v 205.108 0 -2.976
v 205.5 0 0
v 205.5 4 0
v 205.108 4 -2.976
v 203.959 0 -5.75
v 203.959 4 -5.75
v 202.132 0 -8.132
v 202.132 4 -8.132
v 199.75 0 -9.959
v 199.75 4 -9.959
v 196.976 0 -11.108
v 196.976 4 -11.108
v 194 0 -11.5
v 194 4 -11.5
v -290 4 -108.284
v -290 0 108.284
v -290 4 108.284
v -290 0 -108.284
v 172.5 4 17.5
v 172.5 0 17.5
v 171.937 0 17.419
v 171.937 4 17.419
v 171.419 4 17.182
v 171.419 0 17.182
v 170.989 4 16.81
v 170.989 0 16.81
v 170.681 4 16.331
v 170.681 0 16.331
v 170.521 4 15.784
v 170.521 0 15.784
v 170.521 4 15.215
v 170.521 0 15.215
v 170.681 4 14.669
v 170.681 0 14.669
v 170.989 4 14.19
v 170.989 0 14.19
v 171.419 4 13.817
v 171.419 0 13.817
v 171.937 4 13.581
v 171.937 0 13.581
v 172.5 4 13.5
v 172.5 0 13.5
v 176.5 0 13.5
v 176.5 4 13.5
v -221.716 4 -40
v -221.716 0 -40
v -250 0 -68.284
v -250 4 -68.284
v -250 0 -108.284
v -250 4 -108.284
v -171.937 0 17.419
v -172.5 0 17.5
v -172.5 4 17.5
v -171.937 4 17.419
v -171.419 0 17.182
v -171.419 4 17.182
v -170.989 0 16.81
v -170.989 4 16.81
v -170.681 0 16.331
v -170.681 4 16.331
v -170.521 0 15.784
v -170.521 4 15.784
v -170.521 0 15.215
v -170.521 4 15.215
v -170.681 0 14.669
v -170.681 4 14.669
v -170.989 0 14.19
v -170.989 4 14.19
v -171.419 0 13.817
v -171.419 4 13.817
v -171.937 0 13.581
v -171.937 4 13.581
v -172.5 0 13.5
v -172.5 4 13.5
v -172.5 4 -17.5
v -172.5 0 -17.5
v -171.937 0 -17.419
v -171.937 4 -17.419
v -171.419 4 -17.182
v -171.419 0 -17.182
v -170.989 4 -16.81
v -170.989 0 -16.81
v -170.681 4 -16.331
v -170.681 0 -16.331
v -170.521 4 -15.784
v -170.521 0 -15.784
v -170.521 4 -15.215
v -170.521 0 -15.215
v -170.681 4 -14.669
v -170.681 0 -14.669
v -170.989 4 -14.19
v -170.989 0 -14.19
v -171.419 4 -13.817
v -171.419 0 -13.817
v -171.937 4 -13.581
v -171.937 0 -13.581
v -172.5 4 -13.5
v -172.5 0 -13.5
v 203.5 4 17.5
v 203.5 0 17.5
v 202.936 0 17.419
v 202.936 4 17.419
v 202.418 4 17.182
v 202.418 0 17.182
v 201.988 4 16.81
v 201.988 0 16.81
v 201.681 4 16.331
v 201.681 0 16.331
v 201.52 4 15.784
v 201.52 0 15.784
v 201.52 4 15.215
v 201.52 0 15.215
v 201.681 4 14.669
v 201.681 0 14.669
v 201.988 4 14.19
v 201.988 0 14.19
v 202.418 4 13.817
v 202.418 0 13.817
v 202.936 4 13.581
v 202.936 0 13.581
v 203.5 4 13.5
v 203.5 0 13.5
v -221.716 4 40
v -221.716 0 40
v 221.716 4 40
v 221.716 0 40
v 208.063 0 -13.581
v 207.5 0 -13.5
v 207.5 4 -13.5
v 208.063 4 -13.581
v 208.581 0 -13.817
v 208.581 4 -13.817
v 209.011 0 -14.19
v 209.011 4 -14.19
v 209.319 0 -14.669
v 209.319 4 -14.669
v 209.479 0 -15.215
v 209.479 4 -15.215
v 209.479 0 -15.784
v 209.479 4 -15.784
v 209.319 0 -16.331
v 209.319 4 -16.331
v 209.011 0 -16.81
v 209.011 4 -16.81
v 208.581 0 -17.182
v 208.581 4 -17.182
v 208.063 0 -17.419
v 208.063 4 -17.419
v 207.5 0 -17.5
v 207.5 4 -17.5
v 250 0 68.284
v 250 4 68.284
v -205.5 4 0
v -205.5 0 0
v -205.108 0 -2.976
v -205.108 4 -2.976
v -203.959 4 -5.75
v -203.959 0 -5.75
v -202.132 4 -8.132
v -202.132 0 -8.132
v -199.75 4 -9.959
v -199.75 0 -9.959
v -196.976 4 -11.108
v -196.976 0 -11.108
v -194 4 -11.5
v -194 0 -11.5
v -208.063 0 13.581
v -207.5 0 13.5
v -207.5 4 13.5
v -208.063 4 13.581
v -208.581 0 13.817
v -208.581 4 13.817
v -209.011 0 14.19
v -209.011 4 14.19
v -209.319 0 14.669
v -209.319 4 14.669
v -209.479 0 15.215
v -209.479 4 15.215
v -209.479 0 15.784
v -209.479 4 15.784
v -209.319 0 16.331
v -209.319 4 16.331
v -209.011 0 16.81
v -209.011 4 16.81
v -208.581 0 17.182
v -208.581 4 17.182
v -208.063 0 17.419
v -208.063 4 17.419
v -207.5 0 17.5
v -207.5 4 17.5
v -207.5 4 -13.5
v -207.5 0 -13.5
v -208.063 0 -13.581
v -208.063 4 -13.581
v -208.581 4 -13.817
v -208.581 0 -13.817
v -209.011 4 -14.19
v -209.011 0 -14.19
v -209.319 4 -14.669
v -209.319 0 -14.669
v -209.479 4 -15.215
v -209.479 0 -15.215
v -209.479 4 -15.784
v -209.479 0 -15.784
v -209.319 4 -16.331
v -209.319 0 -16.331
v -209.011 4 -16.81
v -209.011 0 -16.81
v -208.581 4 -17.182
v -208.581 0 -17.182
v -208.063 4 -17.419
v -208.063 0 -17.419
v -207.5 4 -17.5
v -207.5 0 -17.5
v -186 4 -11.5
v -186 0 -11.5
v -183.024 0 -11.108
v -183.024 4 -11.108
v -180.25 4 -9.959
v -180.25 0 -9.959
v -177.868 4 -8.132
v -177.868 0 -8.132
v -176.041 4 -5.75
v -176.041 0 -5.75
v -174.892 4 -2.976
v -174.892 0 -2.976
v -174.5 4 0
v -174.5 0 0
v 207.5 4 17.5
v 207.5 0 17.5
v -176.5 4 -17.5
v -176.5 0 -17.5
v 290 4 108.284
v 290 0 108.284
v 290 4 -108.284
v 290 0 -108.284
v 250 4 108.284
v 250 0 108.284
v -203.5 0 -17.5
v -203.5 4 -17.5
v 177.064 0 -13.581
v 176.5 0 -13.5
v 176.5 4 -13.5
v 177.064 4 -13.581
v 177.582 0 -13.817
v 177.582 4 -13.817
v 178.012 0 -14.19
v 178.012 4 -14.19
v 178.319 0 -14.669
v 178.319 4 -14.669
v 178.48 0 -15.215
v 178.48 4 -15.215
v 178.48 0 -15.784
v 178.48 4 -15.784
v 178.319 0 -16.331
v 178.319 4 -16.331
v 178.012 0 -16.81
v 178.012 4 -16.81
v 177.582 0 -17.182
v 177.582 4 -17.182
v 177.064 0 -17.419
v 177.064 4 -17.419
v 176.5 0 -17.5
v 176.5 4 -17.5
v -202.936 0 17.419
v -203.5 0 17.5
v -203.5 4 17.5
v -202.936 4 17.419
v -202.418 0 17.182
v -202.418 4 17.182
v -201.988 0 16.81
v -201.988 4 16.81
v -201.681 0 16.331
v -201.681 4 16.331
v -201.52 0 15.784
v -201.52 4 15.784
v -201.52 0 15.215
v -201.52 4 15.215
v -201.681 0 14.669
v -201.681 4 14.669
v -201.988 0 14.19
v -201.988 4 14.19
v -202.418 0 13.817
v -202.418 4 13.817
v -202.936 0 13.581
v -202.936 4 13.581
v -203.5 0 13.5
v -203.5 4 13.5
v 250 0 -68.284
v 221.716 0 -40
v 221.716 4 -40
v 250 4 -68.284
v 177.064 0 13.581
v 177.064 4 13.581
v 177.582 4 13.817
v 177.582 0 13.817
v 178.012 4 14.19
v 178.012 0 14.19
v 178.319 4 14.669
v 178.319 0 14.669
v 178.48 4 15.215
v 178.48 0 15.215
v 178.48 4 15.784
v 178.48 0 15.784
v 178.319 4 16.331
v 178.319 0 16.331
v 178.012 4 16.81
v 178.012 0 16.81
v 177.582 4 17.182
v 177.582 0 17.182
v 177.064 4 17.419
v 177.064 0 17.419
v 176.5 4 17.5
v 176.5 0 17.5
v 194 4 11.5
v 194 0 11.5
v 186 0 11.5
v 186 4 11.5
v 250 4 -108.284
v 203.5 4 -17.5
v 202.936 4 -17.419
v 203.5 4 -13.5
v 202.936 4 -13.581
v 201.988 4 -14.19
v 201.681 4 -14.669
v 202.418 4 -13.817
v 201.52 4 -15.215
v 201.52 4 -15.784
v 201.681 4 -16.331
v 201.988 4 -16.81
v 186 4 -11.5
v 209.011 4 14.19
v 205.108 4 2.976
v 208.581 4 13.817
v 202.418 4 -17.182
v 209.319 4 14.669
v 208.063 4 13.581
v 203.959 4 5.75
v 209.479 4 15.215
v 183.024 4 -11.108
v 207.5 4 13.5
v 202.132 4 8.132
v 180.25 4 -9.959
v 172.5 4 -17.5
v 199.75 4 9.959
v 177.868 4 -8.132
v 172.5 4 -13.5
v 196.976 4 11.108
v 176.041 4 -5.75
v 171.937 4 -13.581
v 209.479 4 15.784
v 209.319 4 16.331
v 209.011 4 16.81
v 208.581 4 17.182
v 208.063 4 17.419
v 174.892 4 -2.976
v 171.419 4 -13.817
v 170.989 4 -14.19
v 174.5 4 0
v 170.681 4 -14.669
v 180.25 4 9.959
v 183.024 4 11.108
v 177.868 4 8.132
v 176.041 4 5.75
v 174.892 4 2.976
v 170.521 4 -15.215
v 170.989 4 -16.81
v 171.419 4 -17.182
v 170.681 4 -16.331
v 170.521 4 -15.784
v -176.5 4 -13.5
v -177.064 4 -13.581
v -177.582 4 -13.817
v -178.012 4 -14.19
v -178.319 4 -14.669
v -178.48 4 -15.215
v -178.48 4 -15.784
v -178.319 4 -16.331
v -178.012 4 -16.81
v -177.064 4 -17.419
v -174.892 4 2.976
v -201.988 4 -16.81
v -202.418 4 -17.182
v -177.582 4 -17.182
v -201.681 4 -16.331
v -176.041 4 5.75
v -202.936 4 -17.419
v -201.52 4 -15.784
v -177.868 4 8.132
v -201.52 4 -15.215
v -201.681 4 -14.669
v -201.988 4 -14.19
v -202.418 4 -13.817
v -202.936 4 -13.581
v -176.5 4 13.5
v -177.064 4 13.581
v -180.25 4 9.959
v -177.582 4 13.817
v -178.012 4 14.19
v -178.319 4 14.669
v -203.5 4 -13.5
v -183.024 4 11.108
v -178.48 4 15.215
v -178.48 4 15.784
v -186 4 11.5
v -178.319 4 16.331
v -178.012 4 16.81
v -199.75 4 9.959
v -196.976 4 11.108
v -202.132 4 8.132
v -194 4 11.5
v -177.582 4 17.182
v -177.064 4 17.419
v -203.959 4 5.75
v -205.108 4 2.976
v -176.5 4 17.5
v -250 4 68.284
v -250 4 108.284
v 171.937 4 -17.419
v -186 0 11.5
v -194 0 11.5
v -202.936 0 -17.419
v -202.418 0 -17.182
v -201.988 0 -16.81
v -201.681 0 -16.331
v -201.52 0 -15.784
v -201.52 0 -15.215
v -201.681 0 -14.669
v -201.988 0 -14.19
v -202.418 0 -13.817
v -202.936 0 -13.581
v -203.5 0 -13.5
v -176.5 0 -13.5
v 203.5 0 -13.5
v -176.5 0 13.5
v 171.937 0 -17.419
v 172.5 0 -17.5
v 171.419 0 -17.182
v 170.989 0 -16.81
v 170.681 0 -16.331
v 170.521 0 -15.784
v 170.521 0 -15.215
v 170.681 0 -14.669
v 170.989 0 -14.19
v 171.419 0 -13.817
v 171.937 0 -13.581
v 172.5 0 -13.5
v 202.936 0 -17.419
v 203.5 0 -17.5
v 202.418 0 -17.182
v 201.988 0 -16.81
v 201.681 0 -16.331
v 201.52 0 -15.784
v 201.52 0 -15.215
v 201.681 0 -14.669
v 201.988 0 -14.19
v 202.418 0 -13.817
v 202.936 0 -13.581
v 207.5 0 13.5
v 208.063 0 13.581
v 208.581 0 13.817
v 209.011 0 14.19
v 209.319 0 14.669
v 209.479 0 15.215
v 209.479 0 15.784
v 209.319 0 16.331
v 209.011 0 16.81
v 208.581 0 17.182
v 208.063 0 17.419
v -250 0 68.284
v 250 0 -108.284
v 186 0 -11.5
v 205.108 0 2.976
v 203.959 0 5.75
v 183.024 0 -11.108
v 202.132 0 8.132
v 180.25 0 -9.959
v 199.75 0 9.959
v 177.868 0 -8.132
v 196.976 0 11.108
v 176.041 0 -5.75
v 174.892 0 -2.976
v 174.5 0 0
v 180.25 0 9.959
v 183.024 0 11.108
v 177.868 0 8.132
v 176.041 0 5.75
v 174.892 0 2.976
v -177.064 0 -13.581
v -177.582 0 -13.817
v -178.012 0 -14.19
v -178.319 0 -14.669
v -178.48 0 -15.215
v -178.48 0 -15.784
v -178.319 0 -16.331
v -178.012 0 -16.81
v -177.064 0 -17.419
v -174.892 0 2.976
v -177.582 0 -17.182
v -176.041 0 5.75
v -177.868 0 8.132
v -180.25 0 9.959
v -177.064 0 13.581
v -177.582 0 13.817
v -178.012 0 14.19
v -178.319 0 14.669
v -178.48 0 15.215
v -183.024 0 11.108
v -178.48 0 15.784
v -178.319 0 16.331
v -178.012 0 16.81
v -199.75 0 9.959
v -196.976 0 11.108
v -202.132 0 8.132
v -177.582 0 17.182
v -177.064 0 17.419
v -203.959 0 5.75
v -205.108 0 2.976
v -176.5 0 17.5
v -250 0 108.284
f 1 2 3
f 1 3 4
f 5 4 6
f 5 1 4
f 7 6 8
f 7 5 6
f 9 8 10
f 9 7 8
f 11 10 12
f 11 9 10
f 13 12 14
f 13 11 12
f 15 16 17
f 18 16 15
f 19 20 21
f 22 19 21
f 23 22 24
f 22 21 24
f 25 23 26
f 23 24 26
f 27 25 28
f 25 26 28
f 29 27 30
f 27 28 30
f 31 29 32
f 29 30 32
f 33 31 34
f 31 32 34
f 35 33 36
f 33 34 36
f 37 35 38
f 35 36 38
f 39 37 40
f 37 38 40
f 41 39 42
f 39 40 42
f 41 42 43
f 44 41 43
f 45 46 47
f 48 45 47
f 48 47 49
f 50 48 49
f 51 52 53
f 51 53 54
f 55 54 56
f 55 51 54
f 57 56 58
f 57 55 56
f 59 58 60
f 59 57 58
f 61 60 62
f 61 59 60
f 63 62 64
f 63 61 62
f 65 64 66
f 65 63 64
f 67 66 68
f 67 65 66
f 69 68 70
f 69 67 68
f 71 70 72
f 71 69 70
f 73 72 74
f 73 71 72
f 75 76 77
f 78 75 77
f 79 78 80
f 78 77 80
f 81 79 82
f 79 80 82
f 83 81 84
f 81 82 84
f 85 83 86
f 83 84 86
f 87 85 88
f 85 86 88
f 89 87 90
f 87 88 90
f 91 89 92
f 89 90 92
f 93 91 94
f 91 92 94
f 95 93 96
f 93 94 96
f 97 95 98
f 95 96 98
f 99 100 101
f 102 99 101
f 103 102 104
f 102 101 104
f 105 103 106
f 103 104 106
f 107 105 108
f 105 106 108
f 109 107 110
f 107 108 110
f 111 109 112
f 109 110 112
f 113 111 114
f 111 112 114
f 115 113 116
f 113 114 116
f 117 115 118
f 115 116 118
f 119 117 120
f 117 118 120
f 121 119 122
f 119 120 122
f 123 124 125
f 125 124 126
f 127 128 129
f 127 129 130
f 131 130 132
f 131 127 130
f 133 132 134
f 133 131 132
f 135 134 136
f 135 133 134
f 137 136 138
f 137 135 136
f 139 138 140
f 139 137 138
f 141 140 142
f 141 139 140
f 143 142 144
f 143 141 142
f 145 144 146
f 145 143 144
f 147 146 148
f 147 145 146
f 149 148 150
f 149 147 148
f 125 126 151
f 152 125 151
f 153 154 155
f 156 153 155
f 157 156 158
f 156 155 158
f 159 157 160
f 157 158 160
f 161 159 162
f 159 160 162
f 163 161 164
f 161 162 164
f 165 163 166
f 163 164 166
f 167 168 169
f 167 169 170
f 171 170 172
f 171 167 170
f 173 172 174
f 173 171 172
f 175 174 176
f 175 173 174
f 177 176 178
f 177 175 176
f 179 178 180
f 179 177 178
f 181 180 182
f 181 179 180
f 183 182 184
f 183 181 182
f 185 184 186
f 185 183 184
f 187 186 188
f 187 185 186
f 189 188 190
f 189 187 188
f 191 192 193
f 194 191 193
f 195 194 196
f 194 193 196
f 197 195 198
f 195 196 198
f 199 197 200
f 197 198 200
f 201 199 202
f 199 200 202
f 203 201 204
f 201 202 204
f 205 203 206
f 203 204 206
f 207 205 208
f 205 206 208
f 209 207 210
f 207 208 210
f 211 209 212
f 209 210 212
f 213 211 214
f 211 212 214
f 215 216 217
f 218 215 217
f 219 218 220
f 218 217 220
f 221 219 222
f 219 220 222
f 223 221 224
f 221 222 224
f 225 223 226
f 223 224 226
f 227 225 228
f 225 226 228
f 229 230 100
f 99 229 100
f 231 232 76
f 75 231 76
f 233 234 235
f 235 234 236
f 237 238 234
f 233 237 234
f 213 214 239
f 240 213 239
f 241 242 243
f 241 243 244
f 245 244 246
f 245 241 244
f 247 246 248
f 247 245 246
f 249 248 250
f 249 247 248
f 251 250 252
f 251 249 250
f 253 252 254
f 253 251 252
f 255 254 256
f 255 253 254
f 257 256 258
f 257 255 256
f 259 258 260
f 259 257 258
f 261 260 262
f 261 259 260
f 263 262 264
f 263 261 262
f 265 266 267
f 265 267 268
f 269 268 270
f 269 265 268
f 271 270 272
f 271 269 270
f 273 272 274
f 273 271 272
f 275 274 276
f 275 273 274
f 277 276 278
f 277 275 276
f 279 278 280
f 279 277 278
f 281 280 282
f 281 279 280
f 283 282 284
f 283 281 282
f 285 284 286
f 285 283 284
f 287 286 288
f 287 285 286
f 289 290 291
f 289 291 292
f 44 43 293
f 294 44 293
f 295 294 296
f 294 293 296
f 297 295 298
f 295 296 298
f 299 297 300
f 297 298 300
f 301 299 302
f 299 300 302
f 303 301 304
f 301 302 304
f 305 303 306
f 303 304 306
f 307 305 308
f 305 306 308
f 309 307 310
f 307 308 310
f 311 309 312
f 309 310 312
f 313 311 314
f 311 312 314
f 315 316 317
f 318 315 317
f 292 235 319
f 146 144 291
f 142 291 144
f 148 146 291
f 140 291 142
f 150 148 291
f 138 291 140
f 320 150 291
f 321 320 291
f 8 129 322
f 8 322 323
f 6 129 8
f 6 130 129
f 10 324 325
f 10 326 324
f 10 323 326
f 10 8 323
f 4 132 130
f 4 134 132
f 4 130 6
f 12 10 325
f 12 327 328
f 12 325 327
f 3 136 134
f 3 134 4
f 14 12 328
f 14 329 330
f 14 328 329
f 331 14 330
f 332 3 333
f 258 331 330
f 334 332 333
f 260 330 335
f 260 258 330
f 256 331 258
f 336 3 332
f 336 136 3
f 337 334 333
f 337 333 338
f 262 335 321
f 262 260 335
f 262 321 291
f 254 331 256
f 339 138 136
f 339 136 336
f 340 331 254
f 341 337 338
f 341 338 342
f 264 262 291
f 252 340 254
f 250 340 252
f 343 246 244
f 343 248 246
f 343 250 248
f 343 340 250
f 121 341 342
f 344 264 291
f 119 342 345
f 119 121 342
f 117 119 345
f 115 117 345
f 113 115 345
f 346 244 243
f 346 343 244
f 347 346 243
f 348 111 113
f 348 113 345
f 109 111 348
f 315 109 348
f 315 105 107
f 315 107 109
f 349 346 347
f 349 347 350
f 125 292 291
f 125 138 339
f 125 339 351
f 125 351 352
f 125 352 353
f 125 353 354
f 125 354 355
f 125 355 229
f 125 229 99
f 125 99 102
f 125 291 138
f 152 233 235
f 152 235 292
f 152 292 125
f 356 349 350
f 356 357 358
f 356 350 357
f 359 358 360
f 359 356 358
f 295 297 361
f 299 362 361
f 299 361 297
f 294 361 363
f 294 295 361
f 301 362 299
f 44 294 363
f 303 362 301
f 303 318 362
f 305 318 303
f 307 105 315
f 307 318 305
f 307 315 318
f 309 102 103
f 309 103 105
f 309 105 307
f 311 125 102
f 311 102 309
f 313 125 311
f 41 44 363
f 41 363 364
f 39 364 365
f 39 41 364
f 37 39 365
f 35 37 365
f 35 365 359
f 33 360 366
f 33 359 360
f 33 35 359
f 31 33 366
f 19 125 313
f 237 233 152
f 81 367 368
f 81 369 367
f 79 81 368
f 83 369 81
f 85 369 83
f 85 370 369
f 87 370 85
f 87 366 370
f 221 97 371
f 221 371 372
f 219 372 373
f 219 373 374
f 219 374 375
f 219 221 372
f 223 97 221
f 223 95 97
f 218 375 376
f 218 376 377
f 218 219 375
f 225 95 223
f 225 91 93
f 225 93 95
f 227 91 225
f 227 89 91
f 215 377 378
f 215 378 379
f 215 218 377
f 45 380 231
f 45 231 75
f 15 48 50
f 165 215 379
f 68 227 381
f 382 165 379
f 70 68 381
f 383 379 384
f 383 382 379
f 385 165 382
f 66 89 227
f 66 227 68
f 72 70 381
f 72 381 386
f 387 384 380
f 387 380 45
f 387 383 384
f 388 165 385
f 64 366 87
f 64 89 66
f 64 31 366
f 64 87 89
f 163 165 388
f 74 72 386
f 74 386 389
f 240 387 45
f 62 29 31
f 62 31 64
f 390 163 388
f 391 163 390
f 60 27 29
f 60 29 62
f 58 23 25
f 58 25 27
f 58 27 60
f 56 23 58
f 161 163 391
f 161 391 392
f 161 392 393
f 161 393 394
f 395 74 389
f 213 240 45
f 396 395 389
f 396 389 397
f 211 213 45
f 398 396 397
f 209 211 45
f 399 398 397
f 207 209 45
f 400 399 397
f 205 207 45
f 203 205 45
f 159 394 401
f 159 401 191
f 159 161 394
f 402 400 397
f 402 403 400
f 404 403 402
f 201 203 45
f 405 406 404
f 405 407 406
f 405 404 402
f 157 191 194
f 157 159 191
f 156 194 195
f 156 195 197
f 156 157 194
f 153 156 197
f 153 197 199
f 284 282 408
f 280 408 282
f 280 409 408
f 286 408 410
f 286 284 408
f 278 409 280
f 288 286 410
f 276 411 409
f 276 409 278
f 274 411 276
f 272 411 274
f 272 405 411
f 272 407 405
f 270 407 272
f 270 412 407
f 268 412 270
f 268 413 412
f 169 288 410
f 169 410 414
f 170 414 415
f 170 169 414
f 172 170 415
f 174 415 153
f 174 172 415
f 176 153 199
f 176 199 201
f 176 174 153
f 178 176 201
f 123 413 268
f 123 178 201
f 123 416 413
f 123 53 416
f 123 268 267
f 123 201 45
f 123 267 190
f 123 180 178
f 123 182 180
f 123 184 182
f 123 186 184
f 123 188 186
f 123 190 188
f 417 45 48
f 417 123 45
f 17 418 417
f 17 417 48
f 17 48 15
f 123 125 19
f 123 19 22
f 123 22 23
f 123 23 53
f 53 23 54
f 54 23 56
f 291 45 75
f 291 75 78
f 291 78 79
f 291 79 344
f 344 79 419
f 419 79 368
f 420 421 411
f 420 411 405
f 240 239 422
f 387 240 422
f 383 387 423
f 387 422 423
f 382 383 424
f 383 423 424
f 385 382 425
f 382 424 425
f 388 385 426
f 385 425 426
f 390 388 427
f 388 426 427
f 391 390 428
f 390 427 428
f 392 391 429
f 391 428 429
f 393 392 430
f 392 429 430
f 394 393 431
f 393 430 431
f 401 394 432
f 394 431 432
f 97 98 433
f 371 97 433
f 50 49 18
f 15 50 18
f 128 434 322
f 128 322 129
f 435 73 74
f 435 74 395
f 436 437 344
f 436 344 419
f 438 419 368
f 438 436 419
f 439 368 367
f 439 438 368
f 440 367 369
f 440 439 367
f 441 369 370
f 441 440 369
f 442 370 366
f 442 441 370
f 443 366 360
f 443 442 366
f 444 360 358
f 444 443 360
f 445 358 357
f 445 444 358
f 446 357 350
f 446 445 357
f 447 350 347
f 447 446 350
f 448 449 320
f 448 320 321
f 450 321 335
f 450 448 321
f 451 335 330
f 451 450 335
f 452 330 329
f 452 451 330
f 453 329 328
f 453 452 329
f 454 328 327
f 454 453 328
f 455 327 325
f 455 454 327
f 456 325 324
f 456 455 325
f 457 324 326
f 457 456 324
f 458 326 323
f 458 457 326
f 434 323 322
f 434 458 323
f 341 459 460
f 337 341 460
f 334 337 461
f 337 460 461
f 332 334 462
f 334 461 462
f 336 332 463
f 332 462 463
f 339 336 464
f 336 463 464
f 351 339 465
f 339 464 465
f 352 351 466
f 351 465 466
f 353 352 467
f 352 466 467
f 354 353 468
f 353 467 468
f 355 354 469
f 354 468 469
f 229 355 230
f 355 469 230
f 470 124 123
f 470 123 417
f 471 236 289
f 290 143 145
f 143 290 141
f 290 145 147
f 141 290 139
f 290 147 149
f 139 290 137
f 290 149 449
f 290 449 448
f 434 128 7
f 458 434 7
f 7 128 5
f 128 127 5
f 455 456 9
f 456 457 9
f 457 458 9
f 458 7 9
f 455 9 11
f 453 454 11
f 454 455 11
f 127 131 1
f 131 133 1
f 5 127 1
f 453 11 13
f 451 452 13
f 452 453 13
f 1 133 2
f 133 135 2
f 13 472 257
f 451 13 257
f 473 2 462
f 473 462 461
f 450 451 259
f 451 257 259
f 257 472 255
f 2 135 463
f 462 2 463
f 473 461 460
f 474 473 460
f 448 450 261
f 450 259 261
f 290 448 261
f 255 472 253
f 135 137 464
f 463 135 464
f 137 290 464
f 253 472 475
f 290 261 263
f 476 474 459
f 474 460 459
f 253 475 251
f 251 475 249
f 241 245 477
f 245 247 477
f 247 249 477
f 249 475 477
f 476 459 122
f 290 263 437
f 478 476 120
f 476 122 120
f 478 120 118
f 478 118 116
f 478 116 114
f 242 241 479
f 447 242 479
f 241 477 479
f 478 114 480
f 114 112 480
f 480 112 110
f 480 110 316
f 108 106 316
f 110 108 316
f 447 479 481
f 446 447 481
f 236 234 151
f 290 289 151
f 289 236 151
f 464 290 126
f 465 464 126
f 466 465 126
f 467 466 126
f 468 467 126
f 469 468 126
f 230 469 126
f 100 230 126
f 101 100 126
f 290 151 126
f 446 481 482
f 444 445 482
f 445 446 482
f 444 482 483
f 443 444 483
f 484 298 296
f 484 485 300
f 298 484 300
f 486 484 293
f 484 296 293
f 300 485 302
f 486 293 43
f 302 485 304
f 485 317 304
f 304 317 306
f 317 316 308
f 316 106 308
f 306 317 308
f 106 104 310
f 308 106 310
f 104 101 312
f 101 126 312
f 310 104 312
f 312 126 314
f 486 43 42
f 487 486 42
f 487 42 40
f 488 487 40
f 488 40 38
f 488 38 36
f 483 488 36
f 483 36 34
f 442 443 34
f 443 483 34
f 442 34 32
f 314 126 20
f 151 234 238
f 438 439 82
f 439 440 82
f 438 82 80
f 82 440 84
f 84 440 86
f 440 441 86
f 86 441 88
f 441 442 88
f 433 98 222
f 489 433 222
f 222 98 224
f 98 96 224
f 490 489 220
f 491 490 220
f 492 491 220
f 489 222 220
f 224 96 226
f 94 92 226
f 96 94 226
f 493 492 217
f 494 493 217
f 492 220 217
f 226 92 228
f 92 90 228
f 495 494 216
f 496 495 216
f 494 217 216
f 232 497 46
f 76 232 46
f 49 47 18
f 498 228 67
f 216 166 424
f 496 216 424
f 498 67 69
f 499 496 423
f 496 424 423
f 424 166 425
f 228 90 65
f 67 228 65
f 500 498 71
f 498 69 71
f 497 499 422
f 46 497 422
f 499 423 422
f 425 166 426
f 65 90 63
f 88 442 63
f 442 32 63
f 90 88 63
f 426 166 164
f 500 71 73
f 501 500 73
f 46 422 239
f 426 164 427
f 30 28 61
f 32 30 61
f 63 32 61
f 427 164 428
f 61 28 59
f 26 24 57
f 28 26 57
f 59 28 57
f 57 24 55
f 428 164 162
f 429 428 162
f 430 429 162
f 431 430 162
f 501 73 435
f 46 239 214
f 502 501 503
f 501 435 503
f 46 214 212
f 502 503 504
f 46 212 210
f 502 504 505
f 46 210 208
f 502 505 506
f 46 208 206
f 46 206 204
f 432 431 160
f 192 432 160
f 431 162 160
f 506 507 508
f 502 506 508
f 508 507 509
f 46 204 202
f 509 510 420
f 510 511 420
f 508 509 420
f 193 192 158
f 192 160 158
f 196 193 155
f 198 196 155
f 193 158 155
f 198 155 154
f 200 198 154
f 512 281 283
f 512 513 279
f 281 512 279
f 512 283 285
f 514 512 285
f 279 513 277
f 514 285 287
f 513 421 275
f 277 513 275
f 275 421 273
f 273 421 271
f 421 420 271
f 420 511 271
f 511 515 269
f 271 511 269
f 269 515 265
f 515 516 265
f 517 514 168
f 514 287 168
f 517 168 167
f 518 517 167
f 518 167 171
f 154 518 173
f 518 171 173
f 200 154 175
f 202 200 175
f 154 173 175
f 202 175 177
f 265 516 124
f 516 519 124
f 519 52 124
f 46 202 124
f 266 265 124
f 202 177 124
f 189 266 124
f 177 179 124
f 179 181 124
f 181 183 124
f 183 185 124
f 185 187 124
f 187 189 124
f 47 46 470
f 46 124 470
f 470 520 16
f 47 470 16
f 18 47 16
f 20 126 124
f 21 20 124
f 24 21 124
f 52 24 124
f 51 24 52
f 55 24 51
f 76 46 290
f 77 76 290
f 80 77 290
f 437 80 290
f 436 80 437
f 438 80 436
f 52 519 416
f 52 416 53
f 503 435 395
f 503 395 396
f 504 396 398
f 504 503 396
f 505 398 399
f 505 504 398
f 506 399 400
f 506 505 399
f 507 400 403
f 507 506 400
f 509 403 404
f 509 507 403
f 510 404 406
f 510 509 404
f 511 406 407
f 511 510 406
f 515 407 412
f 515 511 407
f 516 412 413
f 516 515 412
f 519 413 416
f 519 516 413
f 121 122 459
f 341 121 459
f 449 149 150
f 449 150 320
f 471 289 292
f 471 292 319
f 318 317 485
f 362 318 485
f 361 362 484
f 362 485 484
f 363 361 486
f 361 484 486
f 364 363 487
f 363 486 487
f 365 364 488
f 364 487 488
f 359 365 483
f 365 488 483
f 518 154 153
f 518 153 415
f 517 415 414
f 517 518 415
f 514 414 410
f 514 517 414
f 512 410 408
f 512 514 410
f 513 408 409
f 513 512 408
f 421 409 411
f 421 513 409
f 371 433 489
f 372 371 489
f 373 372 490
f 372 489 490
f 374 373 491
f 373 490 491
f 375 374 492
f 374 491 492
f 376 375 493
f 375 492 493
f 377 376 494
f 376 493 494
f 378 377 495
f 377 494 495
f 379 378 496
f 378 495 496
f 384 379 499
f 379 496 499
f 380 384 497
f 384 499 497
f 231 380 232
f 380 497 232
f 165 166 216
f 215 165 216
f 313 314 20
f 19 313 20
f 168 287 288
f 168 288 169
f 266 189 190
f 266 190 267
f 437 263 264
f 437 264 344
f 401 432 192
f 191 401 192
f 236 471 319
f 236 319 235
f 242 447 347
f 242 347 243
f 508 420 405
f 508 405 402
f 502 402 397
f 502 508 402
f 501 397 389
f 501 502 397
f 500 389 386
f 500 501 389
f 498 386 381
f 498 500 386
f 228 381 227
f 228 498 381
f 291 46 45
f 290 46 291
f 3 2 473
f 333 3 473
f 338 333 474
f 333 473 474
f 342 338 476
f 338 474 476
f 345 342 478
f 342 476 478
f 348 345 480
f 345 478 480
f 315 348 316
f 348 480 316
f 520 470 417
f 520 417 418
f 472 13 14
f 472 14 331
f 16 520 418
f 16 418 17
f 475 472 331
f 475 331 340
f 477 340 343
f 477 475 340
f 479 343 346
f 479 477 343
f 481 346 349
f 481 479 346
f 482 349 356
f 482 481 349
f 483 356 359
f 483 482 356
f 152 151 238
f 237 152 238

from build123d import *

# Parameters (mm, degrees)
BOSS_EXTRUDE1_DEPTH  = 4
MIRROR6_COPY_1_DEPTH = 4
MIRROR6_COPY_2_DEPTH = 4


with BuildPart() as part:
    # Sketch1 → Boss-Extrude1 (new body)
    with BuildSketch(Plane(origin=(0, 0, 0), x_dir=(1, 0, 0), z_dir=(0, 1, 0))):
        with BuildLine():
            Line((-290, 108.284271247), (-290, 0))
            Line((-290, 0), (-205.5, 0))
            ThreePointArc((-205.5, 0), (-202.131727984, 8.131727984), (-194, 11.5))
            Line((-194, 11.5), (-186, 11.5))
            ThreePointArc((-186, 11.5), (-177.868272016, 8.131727984), (-174.5, 0))
            Line((-174.5, 0), (0, 0))
            Line((0, 0), (0, 40))
            Line((0, 40), (-221.715728753, 40))
            Line((-221.715728753, 40), (-250, 68.284271247))
            Line((-250, 68.284271247), (-250, 108.284271247))
            Line((-250, 108.284271247), (-290, 108.284271247))
        make_face()
        with BuildLine():
            ThreePointArc((-207.499780644, 13.499780644), (-209.499780644, 15.499780644), (-207.499780644, 17.499780644))
            Line((-207.499780644, 17.499780644), (-203.499780644, 17.499780644))
            ThreePointArc((-203.499780644, 17.499780644), (-201.499780644, 15.499780644), (-203.499780644, 13.499780644))
            Line((-203.499780644, 13.499780644), (-207.499780644, 13.499780644))
        make_face(mode=Mode.SUBTRACT)
        with BuildLine():
            Line((-176.500219356, 17.499780644), (-172.500219356, 17.499780644))
            ThreePointArc((-172.500219356, 17.499780644), (-170.500219356, 15.499780644), (-172.500219356, 13.499780644))
            Line((-172.500219356, 13.499780644), (-176.500219356, 13.499780644))
            ThreePointArc((-176.500219356, 13.499780644), (-178.500219356, 15.499780644), (-176.500219356, 17.499780644))
        make_face(mode=Mode.SUBTRACT)
    boss_extrude1 = extrude(amount=BOSS_EXTRUDE1_DEPTH)

    # Mirror1: Boss-Extrude1 across plane
    add(boss_extrude1.mirror(Plane(origin=(0, 4, 0), x_dir=(1, 0, 0), z_dir=(0, 0, -1))))

    # Mirror5: Boss-Extrude1 across plane
    add(boss_extrude1.mirror(Plane(origin=(0, 4, 0), x_dir=(0, 0, 1), z_dir=(1, 0, 0))))

    # Mirror6 copy 1 sketch → Mirror6 copy 1 (add)
    with BuildSketch(Plane(origin=(0, 0, 0), x_dir=(-1, 0, 0), z_dir=(0, 1, 0))):
        with BuildLine():
            Line((-290, 108.284271247), (-290, 0))
            Line((-290, 0), (-205.5, 0))
            ThreePointArc((-205.5, 0), (-202.131727984, 8.131727984), (-194, 11.5))
            Line((-194, 11.5), (-186, 11.5))
            ThreePointArc((-186, 11.5), (-177.868272016, 8.131727984), (-174.5, 0))
            Line((-174.5, 0), (0, 0))
            Line((0, 0), (0, 40))
            Line((0, 40), (-221.715728753, 40))
            Line((-221.715728753, 40), (-250, 68.284271247))
            Line((-250, 68.284271247), (-250, 108.284271247))
            Line((-250, 108.284271247), (-290, 108.284271247))
        make_face()
        with BuildLine():
            ThreePointArc((-207.499780644, 13.499780644), (-209.499780644, 15.499780644), (-207.499780644, 17.499780644))
            Line((-207.499780644, 17.499780644), (-203.499780644, 17.499780644))
            ThreePointArc((-203.499780644, 17.499780644), (-201.499780644, 15.499780644), (-203.499780644, 13.499780644))
            Line((-203.499780644, 13.499780644), (-207.499780644, 13.499780644))
        make_face(mode=Mode.SUBTRACT)
        with BuildLine():
            Line((-176.500219356, 17.499780644), (-172.500219356, 17.499780644))
            ThreePointArc((-172.500219356, 17.499780644), (-170.500219356, 15.499780644), (-172.500219356, 13.499780644))
            Line((-172.500219356, 13.499780644), (-176.500219356, 13.499780644))
            ThreePointArc((-176.500219356, 13.499780644), (-178.500219356, 15.499780644), (-176.500219356, 17.499780644))
        make_face(mode=Mode.SUBTRACT)
    extrude(amount=MIRROR6_COPY_1_DEPTH)

    # Mirror6 copy 2 sketch → Mirror6 copy 2 (add)
    with BuildSketch(Plane(origin=(0, 0, 0), x_dir=(1, 0, 0), z_dir=(0, 1, 0))):
        with BuildLine():
            Line((-290, -108.284271247), (-290, 0))
            Line((-290, 0), (-205.5, 0))
            ThreePointArc((-205.5, 0), (-202.131727984, -8.131727984), (-194, -11.5))
            Line((-194, -11.5), (-186, -11.5))
            ThreePointArc((-186, -11.5), (-177.868272016, -8.131727984), (-174.5, 0))
            Line((-174.5, 0), (0, 0))
            Line((0, 0), (0, -40))
            Line((0, -40), (-221.715728753, -40))
            Line((-221.715728753, -40), (-250, -68.284271247))
            Line((-250, -68.284271247), (-250, -108.284271247))
            Line((-250, -108.284271247), (-290, -108.284271247))
        make_face()
        with BuildLine():
            ThreePointArc((-207.499780644, -13.499780644), (-209.499780644, -15.499780644), (-207.499780644, -17.499780644))
            Line((-207.499780644, -17.499780644), (-203.499780644, -17.499780644))
            ThreePointArc((-203.499780644, -17.499780644), (-201.499780644, -15.499780644), (-203.499780644, -13.499780644))
            Line((-203.499780644, -13.499780644), (-207.499780644, -13.499780644))
        make_face(mode=Mode.SUBTRACT)
        with BuildLine():
            Line((-176.500219356, -17.499780644), (-172.500219356, -17.499780644))
            ThreePointArc((-172.500219356, -17.499780644), (-170.500219356, -15.499780644), (-172.500219356, -13.499780644))
            Line((-172.500219356, -13.499780644), (-176.500219356, -13.499780644))
            ThreePointArc((-176.500219356, -13.499780644), (-178.500219356, -15.499780644), (-176.500219356, -17.499780644))
        make_face(mode=Mode.SUBTRACT)
    extrude(amount=MIRROR6_COPY_2_DEPTH)


solid = part.part
